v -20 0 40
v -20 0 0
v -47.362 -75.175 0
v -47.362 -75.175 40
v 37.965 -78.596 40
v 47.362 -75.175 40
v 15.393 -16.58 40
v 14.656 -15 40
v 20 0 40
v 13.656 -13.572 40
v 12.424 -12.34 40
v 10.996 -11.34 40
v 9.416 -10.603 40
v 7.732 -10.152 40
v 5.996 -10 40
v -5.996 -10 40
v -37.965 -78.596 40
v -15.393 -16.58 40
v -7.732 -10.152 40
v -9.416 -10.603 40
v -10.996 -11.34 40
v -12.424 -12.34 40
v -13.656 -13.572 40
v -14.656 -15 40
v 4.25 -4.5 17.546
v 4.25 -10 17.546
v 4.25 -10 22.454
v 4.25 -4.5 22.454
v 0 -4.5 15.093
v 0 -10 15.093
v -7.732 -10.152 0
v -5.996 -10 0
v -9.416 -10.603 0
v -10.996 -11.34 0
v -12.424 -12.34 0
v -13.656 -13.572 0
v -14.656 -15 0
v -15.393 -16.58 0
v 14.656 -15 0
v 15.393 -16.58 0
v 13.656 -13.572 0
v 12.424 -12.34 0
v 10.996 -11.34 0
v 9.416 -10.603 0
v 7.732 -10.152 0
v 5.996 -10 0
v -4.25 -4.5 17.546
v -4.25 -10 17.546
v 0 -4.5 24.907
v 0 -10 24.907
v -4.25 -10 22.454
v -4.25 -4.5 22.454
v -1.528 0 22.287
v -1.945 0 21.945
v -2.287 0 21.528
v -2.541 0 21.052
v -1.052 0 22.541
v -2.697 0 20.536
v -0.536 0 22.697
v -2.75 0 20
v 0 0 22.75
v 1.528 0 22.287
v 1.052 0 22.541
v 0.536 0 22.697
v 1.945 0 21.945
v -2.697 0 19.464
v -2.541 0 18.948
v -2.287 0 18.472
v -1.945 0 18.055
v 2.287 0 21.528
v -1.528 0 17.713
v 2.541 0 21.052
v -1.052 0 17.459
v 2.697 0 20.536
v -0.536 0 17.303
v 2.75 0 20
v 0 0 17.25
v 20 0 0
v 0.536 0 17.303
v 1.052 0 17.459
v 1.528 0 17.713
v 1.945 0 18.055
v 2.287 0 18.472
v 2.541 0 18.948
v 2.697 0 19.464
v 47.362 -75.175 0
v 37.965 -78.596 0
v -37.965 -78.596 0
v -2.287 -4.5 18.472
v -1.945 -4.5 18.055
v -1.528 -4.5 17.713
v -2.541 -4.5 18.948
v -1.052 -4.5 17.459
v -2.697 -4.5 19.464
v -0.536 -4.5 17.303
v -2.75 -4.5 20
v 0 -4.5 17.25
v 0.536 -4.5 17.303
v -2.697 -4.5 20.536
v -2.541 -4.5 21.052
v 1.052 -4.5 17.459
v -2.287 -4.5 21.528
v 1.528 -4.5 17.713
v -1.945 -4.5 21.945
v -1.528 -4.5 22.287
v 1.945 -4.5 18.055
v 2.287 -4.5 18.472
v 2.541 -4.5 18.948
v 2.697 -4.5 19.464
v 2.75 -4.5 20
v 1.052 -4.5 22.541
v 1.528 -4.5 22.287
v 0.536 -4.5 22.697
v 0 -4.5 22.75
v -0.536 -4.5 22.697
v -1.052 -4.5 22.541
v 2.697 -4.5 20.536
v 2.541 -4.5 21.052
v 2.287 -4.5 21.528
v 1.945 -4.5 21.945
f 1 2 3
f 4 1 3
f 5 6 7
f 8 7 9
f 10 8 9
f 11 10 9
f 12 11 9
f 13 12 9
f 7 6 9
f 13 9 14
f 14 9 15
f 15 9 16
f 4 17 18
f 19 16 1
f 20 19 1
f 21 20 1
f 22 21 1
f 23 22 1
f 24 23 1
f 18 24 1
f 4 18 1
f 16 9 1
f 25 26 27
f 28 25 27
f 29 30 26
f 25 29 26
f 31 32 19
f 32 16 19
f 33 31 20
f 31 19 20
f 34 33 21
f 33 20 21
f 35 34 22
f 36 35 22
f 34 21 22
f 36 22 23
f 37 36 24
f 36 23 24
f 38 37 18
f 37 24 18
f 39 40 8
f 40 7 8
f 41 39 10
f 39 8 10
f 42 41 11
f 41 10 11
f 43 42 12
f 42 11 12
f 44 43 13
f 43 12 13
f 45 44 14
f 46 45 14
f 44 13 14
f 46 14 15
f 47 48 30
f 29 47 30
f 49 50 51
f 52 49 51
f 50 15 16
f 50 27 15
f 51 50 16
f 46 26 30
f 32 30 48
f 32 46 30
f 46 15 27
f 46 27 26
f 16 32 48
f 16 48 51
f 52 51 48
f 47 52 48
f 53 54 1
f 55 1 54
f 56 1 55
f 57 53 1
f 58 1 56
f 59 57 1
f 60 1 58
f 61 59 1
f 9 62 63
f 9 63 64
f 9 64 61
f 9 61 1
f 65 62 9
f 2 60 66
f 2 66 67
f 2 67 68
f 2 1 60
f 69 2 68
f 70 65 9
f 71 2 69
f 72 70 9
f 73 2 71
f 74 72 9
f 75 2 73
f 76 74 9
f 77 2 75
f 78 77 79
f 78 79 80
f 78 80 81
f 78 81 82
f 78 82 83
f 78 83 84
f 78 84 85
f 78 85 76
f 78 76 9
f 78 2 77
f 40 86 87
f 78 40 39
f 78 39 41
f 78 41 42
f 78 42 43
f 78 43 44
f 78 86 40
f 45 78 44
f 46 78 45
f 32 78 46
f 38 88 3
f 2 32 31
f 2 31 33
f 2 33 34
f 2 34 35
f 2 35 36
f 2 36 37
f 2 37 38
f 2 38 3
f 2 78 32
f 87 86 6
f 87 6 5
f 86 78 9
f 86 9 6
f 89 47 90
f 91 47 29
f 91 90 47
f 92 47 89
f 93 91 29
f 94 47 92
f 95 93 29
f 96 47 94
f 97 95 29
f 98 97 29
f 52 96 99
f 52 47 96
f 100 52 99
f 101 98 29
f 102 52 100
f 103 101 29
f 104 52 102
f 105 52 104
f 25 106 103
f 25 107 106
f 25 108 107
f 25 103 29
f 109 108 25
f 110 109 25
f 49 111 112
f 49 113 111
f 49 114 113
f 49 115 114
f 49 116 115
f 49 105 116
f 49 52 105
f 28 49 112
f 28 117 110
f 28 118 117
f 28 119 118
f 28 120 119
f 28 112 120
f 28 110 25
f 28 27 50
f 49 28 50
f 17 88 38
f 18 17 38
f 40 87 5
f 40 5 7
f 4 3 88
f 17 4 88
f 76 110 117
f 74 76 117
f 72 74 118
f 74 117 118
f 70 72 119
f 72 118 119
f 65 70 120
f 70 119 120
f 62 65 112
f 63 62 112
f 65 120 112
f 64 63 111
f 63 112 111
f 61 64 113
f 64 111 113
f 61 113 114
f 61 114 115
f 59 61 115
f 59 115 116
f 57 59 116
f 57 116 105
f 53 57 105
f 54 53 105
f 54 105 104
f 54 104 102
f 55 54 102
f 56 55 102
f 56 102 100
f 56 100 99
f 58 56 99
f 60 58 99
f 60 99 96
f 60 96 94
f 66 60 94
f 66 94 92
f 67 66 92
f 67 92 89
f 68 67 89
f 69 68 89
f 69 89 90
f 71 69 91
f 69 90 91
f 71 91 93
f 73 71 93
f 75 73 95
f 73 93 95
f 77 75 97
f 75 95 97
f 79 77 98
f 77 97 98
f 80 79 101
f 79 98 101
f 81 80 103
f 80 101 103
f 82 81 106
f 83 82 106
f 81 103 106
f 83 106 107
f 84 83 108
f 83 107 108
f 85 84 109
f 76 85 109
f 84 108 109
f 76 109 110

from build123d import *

# Parameters (mm, degrees)
F1_DEPTH = 40
F3_R     = 2.75
F4_DEPTH = 10
F5_R     = 2.75
F6_DEPTH = 5.5
F7_R     = 10


with BuildPart() as f1:
    # F0 (on Top) → F1 (new body)
    with BuildSketch(Plane.XY):
        Polygon((0, 0), (-20, 0), (-20, -10), (-12.9979246179, -10), (0, -10), align=None)
        Polygon((-20, -10), (-20, 0), (-47.3616114661, -75.1754096629), (-37.9646852582, -78.5956110961), (-12.9979246179, -10), align=None)
    extrude(amount=F1_DEPTH)

    # F2: F1 across plane


with BuildPart() as f1_1:
    add(f1.part)
    add(f1.part.mirror(Plane.YZ))

    # F3 (on face) → F4 (cut, through all)
    with BuildSketch(Plane.XZ.offset(10)):
        with Locations((0, 20)):
            Circle(F3_R)
    extrude(amount=-F4_DEPTH, mode=Mode.SUBTRACT)

    # F5 (on face) → F6 (cut)
    with BuildSketch(Plane.XZ.offset(10)):
        Polygon((4.25, 22.4537386441), (0, 24.9074772881), (-4.25, 22.4537386441), (-4.25, 17.5462613559), (0, 15.0925227119), (4.25, 17.5462613559), align=None)
        with Locations((0, 20)):
            Circle(F5_R, mode=Mode.SUBTRACT)
    extrude(amount=-F6_DEPTH, mode=Mode.SUBTRACT)

    # F7
    f7_edges = [f1_1.edges().sort_by_distance(p)[0] for p in [
        (-12.997925, -10, 20),
        (12.997925, -10, 20),
    ]]
    fillet(f7_edges, radius=F7_R)


solid = f1_1.part
